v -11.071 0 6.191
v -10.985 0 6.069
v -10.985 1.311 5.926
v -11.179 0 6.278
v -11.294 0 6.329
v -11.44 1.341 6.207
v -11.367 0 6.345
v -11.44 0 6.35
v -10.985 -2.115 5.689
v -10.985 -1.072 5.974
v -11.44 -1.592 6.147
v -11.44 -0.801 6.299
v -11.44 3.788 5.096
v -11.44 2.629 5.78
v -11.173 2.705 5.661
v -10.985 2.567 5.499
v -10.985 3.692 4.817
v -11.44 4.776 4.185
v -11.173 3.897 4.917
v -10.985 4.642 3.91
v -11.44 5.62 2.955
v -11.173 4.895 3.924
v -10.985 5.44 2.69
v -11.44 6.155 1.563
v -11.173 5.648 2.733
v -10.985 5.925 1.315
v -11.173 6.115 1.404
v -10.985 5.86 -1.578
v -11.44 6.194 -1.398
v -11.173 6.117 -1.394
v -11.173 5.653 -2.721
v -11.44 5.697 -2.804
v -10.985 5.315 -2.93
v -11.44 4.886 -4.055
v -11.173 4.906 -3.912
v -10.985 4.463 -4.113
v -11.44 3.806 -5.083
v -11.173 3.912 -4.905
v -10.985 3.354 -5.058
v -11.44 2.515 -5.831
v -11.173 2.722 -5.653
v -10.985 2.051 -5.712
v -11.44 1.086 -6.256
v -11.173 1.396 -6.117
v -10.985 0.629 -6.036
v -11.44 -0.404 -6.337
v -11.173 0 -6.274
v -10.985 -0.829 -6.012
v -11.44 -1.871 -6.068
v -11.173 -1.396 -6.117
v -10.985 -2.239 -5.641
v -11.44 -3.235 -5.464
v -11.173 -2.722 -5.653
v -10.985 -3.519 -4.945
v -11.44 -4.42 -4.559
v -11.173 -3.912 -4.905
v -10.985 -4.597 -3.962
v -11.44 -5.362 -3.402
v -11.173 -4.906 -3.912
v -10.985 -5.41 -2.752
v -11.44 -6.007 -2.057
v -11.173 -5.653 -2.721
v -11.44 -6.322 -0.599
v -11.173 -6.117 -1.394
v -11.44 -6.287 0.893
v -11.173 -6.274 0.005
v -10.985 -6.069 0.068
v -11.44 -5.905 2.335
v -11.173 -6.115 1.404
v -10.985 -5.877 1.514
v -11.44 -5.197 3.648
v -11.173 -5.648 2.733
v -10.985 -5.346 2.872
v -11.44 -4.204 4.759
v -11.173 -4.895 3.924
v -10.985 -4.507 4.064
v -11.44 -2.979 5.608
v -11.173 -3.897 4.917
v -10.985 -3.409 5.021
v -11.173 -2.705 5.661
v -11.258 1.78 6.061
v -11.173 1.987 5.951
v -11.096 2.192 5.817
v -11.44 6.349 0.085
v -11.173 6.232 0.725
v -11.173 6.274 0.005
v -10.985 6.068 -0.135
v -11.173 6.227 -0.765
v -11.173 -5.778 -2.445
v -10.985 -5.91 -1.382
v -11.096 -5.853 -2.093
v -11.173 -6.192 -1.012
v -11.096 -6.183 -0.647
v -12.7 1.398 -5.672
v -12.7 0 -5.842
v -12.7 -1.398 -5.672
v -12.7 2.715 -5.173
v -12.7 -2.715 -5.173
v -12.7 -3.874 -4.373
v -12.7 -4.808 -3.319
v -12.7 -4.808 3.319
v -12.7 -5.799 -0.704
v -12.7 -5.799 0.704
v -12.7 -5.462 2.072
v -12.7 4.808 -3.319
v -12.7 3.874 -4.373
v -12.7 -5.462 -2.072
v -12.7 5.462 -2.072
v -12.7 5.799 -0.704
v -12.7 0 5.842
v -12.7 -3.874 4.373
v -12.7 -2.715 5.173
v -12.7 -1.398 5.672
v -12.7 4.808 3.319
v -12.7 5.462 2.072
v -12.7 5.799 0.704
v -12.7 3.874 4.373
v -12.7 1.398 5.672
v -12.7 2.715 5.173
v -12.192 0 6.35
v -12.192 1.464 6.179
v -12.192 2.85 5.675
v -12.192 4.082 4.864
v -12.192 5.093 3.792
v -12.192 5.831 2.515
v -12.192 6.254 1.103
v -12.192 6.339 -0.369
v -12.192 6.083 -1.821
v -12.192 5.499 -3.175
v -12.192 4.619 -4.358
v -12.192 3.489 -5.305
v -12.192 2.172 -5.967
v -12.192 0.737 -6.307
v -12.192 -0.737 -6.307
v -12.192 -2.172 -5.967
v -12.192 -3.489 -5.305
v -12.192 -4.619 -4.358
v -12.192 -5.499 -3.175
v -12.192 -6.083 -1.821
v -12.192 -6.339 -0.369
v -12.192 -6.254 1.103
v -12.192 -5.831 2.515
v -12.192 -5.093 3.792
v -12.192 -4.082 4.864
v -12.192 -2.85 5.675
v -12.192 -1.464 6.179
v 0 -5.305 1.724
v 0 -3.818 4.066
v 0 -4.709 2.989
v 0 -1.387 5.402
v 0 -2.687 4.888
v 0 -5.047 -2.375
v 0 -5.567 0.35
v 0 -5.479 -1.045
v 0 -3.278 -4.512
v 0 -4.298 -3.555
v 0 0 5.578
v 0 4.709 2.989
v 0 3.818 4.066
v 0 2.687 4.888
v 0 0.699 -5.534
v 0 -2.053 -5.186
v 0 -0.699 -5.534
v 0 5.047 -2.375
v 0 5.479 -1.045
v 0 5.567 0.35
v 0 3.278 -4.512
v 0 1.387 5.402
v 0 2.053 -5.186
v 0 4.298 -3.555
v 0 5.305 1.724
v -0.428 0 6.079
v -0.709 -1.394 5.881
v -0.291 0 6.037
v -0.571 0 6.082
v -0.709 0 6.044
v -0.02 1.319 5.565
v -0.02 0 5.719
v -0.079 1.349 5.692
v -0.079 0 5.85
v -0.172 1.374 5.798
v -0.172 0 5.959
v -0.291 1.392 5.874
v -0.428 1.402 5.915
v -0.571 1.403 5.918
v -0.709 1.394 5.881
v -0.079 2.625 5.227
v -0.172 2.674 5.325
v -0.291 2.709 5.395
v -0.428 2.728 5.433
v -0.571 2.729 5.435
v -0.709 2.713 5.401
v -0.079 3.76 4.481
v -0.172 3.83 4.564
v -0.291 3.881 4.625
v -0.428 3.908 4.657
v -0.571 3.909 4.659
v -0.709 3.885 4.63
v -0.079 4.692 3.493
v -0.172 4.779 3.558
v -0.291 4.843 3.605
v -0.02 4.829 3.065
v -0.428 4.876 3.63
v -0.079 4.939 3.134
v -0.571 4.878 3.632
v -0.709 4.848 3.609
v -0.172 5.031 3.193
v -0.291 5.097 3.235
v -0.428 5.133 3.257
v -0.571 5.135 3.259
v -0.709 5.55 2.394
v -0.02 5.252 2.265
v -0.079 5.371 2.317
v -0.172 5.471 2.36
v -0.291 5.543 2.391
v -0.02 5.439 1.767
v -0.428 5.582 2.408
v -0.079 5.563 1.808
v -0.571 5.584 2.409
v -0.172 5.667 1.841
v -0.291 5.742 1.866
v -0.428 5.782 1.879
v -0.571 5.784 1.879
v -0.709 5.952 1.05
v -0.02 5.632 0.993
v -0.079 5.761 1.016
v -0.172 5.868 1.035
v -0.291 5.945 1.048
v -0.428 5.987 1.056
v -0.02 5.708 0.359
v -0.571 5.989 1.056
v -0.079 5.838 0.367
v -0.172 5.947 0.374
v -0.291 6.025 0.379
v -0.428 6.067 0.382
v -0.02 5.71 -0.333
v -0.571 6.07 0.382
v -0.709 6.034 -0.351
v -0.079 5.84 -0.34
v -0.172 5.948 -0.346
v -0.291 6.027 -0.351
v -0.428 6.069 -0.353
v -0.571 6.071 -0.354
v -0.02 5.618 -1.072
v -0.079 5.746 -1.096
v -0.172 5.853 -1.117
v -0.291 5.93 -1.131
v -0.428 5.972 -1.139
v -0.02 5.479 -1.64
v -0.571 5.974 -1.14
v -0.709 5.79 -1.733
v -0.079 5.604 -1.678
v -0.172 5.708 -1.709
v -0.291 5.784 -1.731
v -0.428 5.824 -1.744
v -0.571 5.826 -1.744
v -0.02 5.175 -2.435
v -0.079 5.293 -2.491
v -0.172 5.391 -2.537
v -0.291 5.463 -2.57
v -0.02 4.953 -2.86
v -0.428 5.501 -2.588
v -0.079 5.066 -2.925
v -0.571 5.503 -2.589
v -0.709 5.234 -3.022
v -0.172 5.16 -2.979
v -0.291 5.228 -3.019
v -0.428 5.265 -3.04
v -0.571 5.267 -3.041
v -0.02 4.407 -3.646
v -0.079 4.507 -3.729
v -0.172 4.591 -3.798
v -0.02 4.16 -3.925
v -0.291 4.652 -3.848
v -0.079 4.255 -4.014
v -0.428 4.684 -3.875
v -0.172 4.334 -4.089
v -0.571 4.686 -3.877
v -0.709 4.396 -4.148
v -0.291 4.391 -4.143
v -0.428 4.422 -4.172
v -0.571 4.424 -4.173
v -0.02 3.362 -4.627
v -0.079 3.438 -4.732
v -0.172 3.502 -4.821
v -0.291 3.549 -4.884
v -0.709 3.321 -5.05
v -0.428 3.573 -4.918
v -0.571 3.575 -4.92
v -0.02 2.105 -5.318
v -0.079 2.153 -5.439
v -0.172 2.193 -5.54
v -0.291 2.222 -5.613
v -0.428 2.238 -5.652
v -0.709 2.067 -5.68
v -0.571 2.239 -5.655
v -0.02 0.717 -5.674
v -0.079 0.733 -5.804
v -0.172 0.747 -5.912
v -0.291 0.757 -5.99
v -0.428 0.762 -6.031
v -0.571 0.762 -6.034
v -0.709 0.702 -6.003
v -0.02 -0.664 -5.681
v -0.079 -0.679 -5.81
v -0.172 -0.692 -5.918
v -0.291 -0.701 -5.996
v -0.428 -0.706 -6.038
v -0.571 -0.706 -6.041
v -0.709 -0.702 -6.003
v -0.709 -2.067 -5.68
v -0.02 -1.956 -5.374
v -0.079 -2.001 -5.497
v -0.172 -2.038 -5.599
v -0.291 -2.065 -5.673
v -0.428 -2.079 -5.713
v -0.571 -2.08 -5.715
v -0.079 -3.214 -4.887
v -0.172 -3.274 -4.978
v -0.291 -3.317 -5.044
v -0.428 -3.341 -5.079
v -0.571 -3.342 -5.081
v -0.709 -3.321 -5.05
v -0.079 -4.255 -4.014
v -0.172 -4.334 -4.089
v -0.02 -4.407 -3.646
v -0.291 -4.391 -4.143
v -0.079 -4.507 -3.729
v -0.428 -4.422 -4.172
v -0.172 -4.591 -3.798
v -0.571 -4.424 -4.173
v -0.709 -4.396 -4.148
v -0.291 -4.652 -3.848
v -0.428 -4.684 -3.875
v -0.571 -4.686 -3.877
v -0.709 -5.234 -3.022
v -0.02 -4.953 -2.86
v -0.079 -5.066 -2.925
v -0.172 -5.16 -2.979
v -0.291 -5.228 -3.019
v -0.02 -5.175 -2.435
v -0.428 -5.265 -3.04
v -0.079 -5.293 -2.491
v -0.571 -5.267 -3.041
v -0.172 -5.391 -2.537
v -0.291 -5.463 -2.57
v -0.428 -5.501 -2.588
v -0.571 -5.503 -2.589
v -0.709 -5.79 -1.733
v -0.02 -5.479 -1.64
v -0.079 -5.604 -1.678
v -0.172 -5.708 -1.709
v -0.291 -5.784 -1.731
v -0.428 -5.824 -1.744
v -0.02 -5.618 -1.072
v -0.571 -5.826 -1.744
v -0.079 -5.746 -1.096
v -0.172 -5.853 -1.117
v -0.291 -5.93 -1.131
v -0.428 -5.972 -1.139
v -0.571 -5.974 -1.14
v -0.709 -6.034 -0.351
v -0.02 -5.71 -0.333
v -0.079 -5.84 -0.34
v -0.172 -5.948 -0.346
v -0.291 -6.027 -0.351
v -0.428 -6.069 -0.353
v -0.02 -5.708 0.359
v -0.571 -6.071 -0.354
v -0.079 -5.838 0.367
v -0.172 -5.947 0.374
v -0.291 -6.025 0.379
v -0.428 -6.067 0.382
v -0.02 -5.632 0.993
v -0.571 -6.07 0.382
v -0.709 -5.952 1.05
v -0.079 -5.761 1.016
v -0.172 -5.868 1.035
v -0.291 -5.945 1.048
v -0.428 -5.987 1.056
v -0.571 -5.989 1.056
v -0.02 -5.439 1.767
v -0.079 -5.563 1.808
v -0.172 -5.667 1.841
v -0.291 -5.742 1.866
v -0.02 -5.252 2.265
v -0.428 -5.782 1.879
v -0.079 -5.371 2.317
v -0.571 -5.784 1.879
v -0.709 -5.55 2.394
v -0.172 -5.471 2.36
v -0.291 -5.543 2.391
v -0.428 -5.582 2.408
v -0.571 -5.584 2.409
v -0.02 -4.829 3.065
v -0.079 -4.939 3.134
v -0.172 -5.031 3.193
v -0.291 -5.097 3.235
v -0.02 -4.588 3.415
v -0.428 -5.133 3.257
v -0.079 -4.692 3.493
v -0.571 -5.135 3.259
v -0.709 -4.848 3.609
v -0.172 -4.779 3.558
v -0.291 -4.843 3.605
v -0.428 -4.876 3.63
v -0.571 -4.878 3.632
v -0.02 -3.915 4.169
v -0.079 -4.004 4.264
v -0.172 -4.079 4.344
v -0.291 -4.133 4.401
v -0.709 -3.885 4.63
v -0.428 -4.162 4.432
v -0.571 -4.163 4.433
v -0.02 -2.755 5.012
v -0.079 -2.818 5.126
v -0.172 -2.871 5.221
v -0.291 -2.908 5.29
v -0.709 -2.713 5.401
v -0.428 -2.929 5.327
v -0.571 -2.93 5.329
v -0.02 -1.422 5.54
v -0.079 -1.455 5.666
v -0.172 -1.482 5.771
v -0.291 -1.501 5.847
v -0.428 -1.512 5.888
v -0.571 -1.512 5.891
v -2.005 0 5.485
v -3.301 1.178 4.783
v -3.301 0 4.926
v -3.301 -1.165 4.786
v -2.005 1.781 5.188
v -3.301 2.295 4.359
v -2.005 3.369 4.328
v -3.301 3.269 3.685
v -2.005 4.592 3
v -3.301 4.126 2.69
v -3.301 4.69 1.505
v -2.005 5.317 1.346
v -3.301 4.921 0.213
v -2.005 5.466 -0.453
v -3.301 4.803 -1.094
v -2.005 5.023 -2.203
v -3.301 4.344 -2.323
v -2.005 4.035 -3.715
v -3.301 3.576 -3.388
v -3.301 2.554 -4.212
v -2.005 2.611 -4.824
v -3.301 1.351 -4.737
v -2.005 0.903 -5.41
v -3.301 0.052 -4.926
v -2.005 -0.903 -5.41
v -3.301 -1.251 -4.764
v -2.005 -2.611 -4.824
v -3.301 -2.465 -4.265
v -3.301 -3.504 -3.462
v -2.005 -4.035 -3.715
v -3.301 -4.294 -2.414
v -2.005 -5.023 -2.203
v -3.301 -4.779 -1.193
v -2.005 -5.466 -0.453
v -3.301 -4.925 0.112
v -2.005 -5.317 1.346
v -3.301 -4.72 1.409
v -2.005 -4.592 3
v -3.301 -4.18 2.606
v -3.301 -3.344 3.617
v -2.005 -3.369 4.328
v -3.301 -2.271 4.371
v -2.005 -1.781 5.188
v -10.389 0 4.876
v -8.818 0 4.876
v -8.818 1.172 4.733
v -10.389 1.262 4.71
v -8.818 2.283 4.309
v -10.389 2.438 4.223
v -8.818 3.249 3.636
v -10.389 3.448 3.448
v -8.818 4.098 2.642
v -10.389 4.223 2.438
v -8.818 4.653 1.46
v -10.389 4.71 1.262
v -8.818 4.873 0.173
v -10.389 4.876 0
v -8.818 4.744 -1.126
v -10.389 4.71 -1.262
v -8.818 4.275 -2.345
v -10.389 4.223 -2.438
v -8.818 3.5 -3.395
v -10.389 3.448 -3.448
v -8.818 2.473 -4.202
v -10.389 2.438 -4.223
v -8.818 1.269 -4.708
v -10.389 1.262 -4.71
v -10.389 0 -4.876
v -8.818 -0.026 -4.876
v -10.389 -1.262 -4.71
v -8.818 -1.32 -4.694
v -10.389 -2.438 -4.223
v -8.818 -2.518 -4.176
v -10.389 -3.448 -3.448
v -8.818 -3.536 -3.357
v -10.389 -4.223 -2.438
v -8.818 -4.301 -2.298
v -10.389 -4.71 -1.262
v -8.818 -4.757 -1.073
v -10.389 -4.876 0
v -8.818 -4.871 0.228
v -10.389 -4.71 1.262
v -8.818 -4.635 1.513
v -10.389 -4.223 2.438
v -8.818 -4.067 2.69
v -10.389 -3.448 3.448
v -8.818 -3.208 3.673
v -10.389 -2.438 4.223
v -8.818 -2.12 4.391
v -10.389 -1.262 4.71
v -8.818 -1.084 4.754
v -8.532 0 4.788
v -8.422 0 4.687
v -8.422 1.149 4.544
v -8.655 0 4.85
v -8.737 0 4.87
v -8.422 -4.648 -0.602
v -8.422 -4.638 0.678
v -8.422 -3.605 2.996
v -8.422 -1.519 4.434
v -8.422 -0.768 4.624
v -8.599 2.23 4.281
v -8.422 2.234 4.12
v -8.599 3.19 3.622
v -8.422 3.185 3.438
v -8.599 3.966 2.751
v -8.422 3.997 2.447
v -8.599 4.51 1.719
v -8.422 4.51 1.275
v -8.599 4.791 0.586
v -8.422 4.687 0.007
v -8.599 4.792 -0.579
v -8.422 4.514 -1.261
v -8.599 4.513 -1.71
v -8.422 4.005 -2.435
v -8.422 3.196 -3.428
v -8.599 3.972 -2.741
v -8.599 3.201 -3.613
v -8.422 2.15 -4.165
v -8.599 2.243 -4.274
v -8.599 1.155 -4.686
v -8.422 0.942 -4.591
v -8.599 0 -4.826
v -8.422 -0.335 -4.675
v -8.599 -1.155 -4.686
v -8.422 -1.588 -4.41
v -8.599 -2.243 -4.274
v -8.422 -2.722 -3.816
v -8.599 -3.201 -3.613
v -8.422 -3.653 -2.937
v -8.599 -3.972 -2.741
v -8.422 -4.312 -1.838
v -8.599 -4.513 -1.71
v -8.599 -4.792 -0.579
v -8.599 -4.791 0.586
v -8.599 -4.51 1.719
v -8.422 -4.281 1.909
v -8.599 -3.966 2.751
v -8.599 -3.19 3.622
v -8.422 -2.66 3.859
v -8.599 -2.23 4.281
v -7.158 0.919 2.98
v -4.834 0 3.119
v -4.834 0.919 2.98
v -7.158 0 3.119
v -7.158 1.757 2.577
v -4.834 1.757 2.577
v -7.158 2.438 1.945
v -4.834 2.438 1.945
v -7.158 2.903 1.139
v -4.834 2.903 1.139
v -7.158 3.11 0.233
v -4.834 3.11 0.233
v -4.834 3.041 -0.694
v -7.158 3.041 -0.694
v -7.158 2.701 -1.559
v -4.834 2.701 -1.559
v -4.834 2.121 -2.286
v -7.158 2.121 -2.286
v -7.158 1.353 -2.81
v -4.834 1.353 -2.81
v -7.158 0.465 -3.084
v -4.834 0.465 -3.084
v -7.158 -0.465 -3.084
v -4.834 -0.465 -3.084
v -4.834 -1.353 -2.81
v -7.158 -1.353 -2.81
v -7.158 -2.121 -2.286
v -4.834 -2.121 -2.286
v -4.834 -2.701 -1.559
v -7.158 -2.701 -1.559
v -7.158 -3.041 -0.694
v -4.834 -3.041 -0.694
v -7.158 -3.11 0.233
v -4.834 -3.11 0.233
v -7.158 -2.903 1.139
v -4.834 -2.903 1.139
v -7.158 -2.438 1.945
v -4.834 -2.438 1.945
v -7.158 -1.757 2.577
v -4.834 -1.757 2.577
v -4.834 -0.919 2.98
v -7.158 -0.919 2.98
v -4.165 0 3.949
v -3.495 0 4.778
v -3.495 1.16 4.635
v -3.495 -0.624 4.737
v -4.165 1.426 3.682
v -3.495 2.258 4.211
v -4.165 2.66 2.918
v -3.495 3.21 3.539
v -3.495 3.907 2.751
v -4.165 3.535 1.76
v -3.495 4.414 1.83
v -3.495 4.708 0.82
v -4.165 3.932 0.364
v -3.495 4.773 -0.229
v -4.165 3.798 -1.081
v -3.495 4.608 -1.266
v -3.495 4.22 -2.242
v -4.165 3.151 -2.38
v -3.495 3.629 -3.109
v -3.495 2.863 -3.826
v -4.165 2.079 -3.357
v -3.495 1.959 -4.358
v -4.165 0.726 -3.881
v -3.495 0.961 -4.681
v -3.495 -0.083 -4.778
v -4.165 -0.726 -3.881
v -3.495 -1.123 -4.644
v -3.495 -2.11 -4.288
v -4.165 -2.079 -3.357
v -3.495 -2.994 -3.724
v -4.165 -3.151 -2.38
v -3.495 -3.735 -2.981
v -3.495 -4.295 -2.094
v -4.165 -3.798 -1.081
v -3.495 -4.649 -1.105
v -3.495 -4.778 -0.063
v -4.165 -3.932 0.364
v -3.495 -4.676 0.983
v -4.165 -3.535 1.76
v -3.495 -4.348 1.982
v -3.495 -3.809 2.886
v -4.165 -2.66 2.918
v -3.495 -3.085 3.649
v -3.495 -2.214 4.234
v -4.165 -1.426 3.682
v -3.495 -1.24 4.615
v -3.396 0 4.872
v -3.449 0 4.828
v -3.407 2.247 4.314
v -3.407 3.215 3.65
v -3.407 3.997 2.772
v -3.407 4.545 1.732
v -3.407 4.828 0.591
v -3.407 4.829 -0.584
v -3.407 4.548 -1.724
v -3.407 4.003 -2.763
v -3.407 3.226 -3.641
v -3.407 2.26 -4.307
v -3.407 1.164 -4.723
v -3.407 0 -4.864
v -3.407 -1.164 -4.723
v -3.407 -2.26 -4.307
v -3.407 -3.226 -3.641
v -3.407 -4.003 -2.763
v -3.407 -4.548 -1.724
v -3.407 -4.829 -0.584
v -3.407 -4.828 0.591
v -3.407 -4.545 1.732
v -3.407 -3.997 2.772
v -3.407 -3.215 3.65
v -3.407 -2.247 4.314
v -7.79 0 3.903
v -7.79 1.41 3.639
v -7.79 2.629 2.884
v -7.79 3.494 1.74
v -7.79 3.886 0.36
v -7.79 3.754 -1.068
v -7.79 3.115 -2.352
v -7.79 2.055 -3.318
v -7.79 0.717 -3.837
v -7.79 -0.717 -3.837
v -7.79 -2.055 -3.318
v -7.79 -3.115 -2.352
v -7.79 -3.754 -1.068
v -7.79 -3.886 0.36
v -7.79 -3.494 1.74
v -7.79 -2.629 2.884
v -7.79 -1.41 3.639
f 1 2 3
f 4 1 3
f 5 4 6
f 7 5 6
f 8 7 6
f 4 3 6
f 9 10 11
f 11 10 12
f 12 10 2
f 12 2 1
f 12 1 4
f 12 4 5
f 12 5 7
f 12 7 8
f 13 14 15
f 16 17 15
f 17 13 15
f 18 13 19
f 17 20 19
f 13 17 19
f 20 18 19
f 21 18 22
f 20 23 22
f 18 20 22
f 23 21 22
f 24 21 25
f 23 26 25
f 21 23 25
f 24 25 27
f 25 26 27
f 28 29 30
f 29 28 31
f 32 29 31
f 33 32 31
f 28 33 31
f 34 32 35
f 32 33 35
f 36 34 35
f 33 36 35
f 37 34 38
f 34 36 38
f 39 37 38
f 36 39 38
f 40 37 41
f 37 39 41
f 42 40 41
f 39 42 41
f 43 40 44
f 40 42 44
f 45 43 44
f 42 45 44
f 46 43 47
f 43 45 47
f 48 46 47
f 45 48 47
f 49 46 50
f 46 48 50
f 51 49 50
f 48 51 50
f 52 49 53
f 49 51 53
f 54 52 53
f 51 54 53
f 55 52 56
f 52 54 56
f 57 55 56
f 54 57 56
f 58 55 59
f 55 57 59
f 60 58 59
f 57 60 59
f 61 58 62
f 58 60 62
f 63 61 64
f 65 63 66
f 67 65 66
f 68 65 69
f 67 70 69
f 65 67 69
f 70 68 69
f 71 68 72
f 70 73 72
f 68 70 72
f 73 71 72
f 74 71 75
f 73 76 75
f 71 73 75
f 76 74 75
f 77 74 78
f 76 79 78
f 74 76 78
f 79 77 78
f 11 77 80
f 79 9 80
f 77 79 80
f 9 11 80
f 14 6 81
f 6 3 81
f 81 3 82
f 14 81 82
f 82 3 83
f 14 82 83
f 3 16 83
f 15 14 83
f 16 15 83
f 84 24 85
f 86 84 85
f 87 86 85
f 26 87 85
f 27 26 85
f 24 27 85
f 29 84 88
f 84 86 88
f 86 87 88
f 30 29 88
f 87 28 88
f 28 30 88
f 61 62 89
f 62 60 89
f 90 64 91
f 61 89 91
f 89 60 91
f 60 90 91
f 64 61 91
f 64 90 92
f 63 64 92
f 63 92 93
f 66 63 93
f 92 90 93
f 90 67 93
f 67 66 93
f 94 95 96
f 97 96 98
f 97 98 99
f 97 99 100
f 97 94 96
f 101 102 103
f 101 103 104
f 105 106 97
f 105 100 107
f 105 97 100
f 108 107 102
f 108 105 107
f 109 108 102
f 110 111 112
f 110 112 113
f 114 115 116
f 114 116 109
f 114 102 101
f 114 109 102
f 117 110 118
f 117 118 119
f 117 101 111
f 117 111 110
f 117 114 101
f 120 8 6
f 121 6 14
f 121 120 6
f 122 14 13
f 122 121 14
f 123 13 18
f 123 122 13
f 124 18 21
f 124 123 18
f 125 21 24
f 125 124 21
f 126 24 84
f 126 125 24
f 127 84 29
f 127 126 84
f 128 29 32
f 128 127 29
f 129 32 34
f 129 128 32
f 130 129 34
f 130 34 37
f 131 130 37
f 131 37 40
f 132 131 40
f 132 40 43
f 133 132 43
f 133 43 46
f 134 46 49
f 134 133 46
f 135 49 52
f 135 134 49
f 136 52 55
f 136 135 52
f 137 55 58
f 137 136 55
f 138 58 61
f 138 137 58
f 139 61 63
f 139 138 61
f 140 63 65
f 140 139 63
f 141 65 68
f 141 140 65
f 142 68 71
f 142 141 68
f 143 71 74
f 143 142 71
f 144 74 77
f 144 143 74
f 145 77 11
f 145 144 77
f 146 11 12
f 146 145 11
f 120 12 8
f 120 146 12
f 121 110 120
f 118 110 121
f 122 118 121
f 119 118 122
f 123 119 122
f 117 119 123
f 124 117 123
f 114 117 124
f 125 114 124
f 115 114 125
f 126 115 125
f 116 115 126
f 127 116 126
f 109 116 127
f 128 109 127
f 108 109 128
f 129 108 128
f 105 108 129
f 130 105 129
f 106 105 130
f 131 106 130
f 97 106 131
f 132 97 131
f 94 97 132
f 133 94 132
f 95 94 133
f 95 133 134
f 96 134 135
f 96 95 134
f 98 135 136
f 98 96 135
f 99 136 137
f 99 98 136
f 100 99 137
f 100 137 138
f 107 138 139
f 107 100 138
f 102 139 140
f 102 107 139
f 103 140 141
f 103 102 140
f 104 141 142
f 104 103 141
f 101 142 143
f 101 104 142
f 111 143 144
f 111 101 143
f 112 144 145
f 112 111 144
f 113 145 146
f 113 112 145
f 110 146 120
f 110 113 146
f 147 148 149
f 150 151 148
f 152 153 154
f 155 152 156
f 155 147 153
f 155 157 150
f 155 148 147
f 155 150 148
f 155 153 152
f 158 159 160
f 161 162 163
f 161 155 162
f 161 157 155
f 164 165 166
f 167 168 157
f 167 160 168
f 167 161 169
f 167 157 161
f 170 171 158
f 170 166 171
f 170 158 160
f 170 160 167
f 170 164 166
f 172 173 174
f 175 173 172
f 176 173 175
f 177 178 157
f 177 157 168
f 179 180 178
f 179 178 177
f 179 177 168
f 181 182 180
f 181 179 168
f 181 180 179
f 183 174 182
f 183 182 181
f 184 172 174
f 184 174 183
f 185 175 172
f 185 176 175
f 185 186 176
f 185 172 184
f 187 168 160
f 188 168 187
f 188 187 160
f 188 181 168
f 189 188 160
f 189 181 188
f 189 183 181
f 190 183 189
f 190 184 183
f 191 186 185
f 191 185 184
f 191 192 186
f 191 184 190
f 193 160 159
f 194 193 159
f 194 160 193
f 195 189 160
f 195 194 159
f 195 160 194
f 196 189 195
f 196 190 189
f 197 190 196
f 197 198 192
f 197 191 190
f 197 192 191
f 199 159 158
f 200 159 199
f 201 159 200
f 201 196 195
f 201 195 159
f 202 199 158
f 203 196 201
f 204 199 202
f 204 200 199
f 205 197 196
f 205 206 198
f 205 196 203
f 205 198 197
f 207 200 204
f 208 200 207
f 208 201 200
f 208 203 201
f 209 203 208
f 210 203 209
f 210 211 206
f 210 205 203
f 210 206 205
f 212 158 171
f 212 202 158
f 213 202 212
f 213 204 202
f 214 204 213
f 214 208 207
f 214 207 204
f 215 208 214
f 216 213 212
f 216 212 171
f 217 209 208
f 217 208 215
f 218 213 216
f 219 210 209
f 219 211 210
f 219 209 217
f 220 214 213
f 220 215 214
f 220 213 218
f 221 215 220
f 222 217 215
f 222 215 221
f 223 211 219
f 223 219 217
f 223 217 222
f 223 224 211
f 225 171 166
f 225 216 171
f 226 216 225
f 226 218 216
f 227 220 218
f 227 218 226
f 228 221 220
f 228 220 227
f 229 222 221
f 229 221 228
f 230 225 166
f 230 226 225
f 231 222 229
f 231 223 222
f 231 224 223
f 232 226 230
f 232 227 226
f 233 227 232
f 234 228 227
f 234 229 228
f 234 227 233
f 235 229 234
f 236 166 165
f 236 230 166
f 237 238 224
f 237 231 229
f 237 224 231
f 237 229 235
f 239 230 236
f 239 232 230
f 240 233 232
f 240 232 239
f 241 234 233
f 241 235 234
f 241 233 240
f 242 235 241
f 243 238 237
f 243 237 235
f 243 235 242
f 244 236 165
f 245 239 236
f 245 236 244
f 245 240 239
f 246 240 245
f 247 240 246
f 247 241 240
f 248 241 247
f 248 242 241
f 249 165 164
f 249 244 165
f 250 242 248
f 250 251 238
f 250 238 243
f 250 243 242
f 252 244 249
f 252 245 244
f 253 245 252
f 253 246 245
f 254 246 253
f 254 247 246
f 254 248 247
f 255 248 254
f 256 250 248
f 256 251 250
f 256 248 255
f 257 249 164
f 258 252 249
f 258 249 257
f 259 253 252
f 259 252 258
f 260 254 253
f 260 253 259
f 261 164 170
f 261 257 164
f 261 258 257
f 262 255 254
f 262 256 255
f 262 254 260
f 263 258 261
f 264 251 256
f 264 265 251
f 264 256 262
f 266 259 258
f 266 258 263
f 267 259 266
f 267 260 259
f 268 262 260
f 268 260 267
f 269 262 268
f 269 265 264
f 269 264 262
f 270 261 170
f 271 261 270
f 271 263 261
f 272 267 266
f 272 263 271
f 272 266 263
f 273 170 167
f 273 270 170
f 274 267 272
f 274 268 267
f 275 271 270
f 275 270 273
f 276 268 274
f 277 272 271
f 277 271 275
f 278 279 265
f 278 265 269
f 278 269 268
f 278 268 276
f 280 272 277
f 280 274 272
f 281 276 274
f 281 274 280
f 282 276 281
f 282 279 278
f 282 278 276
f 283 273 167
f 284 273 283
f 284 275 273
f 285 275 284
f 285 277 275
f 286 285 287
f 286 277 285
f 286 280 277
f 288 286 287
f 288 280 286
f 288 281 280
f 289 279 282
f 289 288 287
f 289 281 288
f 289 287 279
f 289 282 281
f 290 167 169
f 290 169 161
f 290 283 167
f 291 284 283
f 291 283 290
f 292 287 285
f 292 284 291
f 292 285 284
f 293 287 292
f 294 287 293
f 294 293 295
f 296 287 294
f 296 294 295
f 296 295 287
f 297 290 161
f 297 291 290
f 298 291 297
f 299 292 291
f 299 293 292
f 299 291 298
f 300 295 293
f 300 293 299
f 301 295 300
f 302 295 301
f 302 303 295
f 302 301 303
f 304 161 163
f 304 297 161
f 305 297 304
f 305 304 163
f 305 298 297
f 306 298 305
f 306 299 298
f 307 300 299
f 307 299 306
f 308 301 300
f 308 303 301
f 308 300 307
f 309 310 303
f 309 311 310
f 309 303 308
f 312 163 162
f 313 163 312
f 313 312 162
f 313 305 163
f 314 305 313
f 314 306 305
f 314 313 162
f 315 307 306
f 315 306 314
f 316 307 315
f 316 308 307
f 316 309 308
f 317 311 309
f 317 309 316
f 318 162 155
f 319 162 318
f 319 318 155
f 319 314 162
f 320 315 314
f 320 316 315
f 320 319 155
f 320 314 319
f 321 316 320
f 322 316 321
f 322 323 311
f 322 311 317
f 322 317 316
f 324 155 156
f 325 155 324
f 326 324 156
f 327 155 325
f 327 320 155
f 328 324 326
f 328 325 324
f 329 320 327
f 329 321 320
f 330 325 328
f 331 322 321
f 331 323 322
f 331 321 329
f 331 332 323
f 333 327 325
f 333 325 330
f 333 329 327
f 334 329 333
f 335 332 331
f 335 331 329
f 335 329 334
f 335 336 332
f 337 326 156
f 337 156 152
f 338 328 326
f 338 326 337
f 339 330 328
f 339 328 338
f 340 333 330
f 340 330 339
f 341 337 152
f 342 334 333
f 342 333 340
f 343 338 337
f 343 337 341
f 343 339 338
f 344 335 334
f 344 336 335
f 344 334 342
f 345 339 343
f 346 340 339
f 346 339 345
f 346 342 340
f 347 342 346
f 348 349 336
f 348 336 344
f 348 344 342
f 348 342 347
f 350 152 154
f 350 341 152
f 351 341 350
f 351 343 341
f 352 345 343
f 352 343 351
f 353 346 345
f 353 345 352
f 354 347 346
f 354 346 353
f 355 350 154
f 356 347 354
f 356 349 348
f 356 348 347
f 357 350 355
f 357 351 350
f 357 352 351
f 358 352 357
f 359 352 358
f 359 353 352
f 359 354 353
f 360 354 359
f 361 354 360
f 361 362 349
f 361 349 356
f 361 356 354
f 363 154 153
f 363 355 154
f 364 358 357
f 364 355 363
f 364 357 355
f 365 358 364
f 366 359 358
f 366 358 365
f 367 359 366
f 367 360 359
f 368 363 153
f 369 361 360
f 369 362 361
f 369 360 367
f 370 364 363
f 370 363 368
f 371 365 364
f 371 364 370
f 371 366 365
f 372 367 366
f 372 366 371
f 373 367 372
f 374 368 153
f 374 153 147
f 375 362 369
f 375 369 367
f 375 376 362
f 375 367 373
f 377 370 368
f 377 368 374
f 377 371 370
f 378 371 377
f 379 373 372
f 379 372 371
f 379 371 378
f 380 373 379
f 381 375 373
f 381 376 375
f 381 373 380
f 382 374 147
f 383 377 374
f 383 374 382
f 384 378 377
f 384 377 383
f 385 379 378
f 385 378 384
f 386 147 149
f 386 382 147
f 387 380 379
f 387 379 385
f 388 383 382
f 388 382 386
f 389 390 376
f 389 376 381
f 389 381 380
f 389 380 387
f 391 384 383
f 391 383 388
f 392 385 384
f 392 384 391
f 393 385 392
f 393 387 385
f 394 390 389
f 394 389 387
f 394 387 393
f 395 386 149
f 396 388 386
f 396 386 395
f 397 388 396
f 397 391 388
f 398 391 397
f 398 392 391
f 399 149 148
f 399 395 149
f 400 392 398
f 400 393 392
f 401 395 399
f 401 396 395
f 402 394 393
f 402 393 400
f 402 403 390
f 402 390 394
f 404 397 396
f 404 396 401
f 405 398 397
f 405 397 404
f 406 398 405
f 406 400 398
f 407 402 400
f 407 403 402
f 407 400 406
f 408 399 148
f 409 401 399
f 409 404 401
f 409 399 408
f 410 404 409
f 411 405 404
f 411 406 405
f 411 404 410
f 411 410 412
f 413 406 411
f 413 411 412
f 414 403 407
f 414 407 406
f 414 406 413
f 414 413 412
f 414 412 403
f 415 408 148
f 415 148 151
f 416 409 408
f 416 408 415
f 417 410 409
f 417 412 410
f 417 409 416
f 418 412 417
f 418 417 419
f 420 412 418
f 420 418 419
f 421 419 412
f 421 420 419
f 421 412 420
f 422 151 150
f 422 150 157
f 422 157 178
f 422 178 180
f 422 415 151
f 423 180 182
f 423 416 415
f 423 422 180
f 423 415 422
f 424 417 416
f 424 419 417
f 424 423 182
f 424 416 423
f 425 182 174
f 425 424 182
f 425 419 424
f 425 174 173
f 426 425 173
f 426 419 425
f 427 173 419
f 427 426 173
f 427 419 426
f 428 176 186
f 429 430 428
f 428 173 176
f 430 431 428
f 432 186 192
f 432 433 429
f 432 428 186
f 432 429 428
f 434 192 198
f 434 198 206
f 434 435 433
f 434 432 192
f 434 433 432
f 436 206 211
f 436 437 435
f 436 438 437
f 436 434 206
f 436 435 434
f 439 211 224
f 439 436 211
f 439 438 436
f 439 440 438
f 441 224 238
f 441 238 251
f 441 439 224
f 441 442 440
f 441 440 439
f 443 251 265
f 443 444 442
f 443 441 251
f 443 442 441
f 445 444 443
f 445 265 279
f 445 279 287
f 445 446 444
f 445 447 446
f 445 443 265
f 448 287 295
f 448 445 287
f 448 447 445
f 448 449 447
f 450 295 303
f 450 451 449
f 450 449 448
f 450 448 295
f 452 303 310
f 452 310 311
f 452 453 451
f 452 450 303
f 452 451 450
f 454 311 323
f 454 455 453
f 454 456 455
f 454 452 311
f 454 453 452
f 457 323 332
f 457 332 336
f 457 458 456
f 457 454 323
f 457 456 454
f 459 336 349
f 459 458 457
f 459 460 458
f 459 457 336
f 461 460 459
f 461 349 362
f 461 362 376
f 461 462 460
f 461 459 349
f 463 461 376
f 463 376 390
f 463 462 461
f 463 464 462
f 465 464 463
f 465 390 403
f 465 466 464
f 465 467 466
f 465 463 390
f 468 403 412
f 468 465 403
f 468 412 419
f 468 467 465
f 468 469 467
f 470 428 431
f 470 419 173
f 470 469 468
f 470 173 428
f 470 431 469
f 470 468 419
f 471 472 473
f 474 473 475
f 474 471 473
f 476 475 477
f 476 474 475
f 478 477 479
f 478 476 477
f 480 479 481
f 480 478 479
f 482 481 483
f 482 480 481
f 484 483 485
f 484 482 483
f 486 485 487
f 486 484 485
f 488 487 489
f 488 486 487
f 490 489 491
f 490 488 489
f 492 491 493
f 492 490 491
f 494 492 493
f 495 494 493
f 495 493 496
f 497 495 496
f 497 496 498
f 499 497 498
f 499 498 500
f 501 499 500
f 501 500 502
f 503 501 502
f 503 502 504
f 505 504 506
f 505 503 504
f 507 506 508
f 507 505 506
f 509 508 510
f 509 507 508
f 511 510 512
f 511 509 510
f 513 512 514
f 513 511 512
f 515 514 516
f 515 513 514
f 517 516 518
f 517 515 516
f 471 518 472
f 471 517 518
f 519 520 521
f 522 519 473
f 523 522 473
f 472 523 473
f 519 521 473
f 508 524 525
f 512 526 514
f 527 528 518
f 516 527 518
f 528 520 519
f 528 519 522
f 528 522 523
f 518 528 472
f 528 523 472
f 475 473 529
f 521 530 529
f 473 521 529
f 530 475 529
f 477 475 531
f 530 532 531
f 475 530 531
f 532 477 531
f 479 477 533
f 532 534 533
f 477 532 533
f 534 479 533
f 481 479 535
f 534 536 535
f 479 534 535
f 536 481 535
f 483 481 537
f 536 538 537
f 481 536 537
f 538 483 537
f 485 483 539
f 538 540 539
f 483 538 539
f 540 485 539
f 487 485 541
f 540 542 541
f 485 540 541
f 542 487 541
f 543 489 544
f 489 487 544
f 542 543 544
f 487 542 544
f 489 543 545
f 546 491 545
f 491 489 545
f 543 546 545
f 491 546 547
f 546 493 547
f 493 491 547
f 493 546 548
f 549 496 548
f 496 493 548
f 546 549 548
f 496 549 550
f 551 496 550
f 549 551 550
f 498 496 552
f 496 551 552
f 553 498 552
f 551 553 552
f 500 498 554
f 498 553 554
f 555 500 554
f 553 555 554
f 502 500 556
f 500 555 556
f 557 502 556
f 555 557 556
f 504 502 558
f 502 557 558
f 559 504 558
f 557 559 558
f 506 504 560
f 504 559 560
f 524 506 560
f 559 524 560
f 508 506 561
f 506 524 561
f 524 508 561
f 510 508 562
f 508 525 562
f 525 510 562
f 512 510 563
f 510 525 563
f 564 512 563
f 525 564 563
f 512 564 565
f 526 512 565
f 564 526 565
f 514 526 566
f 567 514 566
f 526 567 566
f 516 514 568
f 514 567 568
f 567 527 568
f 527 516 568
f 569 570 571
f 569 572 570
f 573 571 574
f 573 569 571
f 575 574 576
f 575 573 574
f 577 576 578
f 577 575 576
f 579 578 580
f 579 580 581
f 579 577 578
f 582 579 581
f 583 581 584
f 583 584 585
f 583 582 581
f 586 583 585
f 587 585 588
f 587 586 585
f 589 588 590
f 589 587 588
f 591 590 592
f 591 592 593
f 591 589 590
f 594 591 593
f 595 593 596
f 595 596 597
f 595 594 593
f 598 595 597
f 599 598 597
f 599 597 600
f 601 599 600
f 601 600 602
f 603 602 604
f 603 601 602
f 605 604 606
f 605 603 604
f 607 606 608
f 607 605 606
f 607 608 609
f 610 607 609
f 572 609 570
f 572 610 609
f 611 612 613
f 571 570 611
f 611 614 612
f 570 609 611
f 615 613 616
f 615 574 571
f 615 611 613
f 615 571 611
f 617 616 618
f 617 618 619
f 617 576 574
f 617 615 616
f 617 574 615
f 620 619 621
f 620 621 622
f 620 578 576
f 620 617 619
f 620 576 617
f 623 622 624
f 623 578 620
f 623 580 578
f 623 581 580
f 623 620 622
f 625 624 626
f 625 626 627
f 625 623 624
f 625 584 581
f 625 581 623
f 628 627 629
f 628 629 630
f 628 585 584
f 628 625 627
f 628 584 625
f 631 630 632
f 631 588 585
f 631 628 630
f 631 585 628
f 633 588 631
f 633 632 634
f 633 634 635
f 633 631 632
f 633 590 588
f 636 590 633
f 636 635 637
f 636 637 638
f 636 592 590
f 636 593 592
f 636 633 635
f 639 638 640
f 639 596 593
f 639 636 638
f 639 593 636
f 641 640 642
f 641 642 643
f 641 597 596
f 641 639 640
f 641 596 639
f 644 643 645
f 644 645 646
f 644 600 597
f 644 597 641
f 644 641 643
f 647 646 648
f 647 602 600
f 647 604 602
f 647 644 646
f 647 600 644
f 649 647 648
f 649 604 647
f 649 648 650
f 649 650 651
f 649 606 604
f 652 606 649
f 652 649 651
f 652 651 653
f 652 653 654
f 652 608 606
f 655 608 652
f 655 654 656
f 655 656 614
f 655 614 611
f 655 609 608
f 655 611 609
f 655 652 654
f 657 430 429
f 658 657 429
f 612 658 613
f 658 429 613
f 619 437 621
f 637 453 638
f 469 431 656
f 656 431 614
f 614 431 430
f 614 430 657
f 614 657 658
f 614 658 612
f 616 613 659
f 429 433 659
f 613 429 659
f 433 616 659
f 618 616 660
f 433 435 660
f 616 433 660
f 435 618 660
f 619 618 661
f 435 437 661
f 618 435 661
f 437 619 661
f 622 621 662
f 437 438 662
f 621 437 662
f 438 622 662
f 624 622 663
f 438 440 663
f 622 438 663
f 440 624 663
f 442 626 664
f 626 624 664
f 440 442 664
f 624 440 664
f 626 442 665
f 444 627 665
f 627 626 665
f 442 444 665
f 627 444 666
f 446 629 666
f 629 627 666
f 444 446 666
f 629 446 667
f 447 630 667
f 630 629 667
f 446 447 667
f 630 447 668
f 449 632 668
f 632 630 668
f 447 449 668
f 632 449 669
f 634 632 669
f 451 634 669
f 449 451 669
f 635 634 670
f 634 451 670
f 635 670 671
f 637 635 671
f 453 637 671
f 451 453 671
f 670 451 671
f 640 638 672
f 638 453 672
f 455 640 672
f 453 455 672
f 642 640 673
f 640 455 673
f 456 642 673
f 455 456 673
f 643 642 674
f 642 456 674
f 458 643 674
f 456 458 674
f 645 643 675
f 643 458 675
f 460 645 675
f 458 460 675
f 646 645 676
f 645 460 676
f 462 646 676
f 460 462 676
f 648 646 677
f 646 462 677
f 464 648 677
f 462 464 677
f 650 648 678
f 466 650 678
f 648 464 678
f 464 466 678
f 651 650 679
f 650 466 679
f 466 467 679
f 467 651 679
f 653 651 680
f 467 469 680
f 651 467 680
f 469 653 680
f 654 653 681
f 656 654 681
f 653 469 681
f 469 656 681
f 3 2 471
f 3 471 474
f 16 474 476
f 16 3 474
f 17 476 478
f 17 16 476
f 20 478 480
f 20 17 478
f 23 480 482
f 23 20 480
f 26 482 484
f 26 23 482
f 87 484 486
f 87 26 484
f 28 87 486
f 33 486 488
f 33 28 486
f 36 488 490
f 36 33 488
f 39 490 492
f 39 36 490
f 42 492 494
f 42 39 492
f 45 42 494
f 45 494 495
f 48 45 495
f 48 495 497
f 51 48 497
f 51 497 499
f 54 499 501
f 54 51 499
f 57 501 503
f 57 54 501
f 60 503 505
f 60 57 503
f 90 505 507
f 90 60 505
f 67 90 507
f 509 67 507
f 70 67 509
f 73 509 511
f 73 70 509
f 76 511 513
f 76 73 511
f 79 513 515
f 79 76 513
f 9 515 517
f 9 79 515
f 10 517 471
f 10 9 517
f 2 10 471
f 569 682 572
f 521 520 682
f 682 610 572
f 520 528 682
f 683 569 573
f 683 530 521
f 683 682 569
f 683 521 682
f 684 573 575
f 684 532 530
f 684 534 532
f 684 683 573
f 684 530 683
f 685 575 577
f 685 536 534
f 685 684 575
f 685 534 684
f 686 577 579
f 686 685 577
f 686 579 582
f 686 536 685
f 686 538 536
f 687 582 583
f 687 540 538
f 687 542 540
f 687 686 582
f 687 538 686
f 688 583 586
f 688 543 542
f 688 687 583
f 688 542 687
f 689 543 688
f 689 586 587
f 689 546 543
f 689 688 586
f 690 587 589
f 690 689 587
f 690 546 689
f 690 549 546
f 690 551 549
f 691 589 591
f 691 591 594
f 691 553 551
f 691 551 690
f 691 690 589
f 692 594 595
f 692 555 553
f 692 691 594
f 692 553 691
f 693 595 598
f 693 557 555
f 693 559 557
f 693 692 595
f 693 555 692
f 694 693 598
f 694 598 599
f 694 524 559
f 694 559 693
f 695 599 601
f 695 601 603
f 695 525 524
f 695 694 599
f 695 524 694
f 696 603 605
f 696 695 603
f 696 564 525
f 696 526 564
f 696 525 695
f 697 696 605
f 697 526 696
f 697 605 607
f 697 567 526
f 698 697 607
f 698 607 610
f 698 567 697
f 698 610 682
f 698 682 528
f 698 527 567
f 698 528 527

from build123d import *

# Parameters (mm, degrees)
F2_R    = 0.508
F3_SIZE = 0.508


with BuildPart() as f1:
    # F0 (on Front) → F1 (revolve)
    with BuildSketch(Plane.XZ):
        Polygon((-12.7, 0), (0, 0), (0, 6.35), (-3.416564, 4.876191), (-4.833689, 3.118957), (-7.157773, 3.118957), (-8.574897, 4.876191), (-10.388815, 4.876191), (-11.125719, 6.35), (-12.7, 6.35), align=None)
    revolve(axis=Axis((-6.35, 0, 0), (-1, 0, 0)))

    # F2
    f2_edges = [f1.edges().sort_by_distance(p)[0] for p in [
        (0, 0, -6.35),
        (-3.416564, 0, -4.876191),
        (-8.574897, 0, -4.876191),
        (-11.125719, 0, -6.35),
    ]]
    fillet(f2_edges, radius=F2_R)

    # F3
    f3_edges = [f1.edges().sort_by_distance(p)[0] for p in [
        (-12.7, 0, -6.35),
    ]]
    chamfer(f3_edges, length=F3_SIZE)


solid = f1.part
